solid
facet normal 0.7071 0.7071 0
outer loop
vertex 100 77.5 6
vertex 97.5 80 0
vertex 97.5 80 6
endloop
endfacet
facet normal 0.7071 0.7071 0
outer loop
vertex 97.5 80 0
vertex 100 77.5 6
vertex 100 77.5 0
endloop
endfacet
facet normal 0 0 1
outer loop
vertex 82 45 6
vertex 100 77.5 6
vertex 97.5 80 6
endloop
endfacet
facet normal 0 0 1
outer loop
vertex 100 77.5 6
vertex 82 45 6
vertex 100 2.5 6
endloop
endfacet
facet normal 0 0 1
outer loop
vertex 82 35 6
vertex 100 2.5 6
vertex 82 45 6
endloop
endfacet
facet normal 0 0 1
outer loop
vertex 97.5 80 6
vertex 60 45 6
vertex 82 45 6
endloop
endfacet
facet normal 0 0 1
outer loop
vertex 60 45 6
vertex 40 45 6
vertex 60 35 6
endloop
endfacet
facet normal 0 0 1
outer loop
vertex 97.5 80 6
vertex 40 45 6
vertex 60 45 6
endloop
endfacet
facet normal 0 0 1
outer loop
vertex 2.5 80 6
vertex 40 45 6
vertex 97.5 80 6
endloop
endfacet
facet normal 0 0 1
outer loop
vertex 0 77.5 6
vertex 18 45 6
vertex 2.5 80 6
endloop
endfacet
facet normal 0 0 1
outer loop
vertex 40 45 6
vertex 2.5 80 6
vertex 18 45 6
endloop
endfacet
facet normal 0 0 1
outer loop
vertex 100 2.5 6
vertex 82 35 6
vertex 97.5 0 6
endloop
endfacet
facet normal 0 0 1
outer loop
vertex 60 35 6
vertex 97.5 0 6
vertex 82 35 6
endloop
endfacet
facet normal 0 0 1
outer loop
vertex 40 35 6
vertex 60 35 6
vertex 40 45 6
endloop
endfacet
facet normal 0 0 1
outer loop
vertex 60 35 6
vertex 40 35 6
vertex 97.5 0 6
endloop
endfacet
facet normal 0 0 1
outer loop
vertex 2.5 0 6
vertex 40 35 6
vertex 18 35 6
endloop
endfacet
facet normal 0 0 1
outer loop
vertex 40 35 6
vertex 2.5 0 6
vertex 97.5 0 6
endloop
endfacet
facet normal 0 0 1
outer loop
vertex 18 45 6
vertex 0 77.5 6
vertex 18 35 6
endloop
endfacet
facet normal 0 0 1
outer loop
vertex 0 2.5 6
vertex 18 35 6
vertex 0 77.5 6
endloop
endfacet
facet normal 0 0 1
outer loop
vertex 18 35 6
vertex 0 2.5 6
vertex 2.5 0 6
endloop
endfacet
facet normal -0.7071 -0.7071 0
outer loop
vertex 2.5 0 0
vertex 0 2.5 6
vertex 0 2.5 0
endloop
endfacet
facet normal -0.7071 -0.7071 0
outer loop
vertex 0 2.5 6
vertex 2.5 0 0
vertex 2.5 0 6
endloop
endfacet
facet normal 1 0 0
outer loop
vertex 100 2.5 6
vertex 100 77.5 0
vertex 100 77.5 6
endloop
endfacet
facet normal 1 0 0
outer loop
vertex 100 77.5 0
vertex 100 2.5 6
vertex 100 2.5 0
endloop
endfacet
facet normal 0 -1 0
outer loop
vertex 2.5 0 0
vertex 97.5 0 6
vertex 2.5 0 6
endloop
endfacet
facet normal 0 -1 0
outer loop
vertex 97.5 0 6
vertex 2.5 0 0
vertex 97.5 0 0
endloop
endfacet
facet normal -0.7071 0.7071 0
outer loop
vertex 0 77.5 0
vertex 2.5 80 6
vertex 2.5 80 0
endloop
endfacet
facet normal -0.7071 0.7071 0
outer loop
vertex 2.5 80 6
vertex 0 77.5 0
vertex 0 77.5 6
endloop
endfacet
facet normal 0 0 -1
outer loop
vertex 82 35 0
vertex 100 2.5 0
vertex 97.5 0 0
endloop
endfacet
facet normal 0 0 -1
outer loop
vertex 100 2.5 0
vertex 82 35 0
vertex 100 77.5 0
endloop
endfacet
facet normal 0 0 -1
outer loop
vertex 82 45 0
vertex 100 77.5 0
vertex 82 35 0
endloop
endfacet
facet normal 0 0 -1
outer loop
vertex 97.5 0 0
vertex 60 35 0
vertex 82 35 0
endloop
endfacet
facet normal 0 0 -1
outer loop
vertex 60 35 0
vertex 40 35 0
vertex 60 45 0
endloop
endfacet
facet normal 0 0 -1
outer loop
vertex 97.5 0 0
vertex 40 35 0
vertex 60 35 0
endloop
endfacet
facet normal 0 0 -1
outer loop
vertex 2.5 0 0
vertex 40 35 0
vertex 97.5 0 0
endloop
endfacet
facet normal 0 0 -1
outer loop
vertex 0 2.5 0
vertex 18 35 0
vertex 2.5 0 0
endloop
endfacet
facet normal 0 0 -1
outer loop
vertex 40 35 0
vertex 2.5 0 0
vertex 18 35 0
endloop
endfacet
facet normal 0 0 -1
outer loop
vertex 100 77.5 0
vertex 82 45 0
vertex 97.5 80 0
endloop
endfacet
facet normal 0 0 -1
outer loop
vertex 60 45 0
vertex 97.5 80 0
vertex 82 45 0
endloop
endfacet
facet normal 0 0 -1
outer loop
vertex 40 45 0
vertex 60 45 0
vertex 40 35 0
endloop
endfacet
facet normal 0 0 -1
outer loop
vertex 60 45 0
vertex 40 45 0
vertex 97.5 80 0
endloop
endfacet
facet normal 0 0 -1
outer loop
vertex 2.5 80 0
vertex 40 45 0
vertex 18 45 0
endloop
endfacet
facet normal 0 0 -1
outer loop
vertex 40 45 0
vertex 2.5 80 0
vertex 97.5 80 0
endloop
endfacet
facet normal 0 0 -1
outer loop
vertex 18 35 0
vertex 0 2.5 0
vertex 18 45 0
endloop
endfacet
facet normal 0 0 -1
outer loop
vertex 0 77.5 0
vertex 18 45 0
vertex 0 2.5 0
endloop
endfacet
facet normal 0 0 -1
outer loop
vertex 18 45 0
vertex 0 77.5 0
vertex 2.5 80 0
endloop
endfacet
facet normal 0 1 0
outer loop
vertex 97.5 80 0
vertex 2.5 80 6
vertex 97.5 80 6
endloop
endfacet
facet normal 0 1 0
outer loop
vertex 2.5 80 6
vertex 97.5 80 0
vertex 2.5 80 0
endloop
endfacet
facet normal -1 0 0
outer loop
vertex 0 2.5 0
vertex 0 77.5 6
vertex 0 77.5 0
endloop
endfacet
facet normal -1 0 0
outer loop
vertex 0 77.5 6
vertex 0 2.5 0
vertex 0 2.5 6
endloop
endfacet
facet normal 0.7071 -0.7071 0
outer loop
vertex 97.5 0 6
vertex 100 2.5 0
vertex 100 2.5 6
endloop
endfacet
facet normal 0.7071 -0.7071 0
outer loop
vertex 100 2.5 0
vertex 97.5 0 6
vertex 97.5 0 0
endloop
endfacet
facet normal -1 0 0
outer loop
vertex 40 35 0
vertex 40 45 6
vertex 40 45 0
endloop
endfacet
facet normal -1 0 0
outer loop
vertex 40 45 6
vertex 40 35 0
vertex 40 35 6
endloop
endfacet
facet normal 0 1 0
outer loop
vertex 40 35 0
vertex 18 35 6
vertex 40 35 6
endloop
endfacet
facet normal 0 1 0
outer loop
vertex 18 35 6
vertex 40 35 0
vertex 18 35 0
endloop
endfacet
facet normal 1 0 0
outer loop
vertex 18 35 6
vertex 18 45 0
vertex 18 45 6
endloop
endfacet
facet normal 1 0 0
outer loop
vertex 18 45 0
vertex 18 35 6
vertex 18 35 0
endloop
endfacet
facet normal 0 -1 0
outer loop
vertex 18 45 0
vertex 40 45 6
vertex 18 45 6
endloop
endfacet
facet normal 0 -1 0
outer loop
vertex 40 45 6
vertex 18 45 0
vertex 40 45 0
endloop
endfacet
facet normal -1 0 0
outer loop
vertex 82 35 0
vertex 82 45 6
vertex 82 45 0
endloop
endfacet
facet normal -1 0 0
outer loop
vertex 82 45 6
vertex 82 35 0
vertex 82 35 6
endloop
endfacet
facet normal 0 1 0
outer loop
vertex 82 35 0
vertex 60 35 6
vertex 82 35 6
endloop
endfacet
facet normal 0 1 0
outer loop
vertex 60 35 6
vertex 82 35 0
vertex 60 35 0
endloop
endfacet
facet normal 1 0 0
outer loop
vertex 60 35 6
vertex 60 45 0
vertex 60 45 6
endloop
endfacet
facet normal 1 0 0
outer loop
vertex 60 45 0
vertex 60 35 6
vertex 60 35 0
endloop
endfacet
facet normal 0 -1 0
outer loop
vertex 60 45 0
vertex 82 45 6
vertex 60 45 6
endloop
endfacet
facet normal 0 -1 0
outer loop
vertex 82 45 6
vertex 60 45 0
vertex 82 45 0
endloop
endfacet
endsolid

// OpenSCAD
$fn = 32;

// ----------------------------------------------------------------------
// Windowed plate: 2 voids, 100 x 80 x 6 mm
// ----------------------------------------------------------------------

// --- parameters (mm) ---
plate_l = 100;            // plate length, X
plate_w = 80;             // plate width, Y
plate_t = 6;              // plate thickness, Z
edge_margin = 8;          // wall from the plate edge to any window
windows = 2;              // number of windows in the row
win_l = 22;               // window length
win_w = 10;               // window width
win_pitch = 42;           // window pitch along X
depth_1 = 6;              // depth of void 1 (full thickness = through)
depth_2 = 6;              // depth of void 2 (full thickness = through)
corner_c = 2.5;           // corner chamfer of the plate

profile = [[2.5, 0], [97.5, 0], [100, 2.5], [100, 77.5], [97.5, 80], [2.5, 80], [0, 77.5], [0, 2.5]];  // primary outline, 8 points, counter clockwise
void_1 = [[18, 35], [40, 35], [40, 45], [18, 45]];  // window 1 of the row, 4 points
void_2 = [[60, 35], [82, 35], [82, 45], [60, 45]];  // window 2 of the row, 4 points

// --- the one profile operation ---
difference() {
  linear_extrude(height = plate_t) polygon(points = profile);
  translate([0, 0, -1])
    linear_extrude(height = plate_t + 2) polygon(points = void_1);
  translate([0, 0, -1])
    linear_extrude(height = plate_t + 2) polygon(points = void_2);
}
